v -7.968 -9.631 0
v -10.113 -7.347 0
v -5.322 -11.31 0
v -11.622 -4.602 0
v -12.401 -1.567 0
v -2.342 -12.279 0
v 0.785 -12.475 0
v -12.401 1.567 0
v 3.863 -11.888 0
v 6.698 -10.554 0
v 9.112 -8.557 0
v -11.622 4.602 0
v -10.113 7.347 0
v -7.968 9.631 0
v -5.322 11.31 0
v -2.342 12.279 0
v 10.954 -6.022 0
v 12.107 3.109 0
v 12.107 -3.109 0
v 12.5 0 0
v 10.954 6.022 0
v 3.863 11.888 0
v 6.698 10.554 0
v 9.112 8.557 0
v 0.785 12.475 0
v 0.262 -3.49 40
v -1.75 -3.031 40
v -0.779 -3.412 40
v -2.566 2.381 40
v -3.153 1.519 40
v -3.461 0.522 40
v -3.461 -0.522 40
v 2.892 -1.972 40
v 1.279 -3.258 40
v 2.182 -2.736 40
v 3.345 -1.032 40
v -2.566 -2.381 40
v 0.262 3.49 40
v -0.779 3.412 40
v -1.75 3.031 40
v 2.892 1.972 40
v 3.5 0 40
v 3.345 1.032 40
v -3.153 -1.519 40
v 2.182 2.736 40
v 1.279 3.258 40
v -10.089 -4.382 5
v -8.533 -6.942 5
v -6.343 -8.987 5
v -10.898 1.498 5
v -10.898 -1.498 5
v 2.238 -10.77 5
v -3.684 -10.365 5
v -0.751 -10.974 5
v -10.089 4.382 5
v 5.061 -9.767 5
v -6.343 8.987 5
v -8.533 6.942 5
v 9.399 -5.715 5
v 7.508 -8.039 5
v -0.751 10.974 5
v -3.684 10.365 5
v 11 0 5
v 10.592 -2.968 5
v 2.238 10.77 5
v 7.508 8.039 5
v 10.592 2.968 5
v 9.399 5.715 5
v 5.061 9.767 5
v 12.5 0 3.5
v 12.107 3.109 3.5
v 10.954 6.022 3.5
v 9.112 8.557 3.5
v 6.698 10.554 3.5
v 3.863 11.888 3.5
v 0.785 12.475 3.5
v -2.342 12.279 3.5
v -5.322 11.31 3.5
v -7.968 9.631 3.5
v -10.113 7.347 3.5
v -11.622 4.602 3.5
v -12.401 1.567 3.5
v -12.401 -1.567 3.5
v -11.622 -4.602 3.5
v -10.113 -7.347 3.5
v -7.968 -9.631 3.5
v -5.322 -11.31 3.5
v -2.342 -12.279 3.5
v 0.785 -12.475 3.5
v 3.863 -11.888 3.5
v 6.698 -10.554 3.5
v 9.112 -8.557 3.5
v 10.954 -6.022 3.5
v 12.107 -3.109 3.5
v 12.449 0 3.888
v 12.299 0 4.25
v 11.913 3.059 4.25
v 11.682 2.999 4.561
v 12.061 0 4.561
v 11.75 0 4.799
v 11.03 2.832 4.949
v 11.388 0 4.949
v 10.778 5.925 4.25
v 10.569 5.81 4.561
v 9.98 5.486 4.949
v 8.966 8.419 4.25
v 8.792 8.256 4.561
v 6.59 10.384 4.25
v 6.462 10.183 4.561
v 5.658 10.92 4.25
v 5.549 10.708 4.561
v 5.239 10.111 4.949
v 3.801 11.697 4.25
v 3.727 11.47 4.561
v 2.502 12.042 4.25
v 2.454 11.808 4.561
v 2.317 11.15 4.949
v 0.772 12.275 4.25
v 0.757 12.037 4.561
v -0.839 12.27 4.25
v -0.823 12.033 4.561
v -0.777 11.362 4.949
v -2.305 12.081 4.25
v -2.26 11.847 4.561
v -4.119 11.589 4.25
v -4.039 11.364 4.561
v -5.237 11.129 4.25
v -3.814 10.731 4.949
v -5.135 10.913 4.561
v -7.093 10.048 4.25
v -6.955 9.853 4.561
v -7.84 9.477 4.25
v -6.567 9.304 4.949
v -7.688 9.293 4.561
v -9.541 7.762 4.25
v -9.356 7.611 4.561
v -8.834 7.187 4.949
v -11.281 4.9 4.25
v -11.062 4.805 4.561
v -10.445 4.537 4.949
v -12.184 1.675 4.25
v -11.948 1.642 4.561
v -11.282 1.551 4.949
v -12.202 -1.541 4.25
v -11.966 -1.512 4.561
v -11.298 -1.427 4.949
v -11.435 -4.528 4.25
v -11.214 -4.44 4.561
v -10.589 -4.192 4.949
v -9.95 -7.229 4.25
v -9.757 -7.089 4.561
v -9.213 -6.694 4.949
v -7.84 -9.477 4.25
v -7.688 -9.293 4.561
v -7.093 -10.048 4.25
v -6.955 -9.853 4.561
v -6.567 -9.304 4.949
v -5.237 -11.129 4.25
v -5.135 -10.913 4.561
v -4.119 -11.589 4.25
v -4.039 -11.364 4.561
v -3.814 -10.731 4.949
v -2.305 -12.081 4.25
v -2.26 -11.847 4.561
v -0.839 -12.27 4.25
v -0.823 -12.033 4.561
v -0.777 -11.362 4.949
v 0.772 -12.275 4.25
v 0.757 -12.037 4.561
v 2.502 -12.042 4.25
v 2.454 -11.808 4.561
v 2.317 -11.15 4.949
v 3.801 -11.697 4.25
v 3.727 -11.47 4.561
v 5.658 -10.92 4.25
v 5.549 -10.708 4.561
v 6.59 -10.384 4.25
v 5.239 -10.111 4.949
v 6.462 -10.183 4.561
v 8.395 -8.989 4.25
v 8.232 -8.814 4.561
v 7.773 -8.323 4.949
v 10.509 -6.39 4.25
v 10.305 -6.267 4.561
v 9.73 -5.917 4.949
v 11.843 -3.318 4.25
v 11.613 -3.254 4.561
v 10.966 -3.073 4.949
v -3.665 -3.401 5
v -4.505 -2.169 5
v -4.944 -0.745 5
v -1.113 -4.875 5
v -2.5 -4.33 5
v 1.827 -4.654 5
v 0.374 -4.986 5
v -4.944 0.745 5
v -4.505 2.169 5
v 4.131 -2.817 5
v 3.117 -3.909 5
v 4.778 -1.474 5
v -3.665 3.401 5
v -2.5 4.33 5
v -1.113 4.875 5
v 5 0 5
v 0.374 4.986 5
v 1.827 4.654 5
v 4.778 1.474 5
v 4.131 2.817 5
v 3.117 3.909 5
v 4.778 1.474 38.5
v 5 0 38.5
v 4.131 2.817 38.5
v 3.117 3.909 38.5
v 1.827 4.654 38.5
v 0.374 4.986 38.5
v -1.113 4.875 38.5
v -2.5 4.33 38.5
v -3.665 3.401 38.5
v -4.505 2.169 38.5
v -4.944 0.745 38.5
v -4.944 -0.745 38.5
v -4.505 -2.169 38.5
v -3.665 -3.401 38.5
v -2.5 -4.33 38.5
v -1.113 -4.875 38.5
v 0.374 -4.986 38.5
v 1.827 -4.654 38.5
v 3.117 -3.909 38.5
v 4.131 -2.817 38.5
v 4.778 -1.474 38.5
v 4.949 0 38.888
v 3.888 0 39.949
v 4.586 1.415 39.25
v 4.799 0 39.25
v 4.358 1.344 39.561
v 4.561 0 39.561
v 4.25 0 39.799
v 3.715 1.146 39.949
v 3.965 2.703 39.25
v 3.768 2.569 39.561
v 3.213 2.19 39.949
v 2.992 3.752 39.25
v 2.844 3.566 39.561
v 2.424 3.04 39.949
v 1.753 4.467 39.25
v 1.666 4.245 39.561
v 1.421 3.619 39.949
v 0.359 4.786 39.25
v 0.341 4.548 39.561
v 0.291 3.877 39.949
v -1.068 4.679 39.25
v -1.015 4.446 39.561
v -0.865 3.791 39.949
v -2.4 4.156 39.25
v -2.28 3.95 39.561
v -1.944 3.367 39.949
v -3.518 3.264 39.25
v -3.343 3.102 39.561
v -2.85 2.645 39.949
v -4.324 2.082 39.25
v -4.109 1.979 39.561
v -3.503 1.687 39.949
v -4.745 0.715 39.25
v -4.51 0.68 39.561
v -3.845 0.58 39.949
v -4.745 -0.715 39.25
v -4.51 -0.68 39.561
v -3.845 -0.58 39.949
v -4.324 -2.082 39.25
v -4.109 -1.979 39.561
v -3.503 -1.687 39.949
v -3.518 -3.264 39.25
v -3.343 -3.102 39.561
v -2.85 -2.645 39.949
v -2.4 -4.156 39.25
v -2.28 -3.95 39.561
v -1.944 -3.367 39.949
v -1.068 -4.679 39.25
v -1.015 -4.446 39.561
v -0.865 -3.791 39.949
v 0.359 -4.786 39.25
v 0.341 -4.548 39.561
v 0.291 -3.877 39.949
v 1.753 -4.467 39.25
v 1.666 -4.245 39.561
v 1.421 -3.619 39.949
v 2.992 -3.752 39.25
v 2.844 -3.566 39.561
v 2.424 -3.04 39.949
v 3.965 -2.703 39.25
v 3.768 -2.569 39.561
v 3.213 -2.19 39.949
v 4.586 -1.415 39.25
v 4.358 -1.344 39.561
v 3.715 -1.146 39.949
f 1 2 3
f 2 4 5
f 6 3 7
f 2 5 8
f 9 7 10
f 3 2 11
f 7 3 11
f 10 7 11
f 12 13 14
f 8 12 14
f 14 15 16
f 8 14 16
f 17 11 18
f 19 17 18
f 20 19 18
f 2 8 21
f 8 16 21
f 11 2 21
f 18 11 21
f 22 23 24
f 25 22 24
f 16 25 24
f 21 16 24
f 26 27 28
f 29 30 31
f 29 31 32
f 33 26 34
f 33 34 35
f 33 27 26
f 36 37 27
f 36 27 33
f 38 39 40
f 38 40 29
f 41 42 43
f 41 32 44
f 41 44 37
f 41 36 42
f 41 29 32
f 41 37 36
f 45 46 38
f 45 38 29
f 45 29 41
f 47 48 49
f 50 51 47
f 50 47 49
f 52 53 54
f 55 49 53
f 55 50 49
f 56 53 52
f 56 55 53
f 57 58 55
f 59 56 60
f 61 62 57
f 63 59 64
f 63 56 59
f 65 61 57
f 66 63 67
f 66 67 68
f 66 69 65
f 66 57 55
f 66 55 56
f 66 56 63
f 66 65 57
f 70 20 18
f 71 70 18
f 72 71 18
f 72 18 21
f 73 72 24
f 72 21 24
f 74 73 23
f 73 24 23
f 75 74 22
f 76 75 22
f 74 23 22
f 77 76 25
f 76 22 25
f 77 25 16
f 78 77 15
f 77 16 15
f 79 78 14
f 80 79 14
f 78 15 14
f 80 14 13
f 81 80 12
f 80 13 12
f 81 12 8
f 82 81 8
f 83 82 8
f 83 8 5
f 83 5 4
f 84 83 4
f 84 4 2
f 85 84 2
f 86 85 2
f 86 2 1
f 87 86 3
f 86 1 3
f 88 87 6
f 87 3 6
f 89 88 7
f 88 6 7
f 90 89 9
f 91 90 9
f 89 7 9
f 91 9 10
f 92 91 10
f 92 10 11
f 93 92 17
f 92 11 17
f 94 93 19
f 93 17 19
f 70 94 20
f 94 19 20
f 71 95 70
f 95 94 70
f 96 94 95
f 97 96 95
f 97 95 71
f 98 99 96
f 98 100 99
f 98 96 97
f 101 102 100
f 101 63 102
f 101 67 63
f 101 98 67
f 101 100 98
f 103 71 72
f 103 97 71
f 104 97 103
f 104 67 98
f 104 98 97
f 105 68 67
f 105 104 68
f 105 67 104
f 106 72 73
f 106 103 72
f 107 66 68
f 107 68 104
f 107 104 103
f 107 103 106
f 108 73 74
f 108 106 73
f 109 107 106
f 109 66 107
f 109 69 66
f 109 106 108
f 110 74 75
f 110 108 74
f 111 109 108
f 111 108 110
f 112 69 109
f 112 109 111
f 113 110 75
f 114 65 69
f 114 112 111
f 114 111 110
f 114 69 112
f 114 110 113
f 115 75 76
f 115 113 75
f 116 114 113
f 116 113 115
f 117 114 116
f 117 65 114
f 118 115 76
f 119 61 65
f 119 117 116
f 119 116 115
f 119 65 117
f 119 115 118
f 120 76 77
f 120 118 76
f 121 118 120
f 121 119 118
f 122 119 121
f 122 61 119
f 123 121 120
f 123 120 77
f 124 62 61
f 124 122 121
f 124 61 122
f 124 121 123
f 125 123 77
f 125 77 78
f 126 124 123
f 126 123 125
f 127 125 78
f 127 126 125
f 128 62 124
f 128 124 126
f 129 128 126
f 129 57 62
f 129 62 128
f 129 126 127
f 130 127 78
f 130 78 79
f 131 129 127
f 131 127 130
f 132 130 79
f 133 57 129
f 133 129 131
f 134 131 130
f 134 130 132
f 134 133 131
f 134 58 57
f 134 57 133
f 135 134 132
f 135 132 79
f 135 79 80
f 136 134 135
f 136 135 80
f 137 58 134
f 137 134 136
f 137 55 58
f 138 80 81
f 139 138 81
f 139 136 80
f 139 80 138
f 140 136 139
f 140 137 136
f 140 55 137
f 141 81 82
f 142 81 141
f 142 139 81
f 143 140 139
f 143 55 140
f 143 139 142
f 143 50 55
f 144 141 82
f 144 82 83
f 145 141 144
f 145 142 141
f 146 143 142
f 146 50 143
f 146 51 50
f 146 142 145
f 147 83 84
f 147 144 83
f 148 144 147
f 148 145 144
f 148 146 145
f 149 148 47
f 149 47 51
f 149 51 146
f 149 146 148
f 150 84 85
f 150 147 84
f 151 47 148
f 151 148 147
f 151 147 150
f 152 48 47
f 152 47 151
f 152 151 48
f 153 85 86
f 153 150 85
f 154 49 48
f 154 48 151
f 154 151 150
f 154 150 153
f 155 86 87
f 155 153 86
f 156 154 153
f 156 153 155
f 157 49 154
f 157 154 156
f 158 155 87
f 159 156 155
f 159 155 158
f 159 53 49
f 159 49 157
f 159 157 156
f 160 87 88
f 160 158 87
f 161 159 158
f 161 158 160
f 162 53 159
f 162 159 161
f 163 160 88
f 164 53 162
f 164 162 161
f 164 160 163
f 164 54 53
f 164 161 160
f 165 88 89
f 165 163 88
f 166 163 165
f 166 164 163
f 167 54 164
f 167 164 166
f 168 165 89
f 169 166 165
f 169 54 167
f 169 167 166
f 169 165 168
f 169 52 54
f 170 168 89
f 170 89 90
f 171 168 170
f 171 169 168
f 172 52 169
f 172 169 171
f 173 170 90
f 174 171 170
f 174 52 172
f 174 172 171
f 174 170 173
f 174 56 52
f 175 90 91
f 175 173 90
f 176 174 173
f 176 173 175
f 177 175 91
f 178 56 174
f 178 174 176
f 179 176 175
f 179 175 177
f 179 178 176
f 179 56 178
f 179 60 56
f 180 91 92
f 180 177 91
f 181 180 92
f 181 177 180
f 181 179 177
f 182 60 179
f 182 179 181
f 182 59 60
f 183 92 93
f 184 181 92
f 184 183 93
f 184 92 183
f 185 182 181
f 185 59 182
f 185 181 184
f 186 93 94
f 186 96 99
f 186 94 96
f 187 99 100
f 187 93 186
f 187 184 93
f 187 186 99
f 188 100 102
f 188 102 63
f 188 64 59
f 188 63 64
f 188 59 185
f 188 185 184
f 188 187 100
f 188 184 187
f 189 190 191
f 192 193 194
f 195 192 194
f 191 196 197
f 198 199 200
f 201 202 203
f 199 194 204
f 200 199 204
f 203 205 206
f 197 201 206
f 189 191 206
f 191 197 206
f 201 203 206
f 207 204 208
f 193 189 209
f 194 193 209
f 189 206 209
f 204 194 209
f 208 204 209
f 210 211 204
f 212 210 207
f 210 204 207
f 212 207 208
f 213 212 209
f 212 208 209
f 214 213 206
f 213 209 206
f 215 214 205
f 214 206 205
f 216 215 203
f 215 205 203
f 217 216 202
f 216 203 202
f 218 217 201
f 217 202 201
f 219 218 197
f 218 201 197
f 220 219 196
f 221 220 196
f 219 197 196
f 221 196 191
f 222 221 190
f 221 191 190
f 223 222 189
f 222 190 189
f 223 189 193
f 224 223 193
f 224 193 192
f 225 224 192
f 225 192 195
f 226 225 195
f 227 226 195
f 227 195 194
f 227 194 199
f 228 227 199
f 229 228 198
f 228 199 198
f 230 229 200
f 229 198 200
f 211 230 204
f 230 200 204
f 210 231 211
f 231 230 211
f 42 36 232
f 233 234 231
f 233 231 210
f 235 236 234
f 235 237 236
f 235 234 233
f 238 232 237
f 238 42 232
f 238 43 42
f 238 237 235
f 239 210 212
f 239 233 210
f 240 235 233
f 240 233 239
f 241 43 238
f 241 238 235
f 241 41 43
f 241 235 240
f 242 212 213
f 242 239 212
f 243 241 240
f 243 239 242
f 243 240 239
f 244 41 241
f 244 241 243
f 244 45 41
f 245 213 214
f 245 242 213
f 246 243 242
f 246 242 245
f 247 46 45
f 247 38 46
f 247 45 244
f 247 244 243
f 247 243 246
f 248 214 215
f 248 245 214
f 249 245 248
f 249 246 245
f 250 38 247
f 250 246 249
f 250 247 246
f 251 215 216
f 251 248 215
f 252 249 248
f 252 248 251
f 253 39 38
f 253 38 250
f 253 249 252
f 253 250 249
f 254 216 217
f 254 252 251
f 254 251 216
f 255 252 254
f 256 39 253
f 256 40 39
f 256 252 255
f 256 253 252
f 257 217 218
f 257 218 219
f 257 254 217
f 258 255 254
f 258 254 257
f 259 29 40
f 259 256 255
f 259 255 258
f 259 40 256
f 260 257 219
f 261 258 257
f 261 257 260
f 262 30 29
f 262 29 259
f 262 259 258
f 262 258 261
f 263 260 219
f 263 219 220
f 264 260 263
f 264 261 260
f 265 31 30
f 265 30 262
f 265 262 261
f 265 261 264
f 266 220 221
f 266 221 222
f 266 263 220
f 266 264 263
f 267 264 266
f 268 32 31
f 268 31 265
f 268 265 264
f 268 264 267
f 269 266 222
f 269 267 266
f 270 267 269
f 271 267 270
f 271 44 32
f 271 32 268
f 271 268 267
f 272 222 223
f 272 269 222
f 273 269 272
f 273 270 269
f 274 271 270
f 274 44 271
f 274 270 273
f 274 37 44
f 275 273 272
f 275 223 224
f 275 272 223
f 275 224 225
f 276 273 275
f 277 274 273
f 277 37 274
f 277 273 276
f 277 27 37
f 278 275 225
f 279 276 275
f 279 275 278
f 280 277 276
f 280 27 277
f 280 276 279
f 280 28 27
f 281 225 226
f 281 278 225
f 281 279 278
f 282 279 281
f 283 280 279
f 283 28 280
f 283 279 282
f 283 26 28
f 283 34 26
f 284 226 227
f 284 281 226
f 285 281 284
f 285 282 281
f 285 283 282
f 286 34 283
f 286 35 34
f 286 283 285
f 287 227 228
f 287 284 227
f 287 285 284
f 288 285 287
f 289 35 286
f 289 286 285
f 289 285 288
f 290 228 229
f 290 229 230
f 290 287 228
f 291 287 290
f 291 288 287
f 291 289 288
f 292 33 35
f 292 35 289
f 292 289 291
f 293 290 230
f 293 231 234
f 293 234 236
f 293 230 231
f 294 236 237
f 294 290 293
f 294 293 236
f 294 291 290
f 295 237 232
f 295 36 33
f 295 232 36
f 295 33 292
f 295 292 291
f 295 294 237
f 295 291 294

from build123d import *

# Parameters (mm, degrees)
F0_R     = 12.5
F1_DEPTH = 5
F2_R     = 5
F3_DEPTH = 35
F4_R     = 1.5
F4_2_R   = 1.5


with BuildPart() as f1:
    # F0 (on Top) → F1 (new body)
    with BuildSketch(Plane.XY):
        Circle(F0_R)
    extrude(amount=F1_DEPTH)

    # F4#2
    f4_2_edges = [f1.edges().sort_by_distance(p)[0] for p in [
        (-12.5, 0, 5),
    ]]
    fillet(f4_2_edges, radius=F4_2_R)


with BuildPart() as f3:
    # F2 (on face) → F3 (new body)
    with BuildSketch(Plane.XY.offset(5)):
        Circle(F2_R)
    extrude(amount=F3_DEPTH)

    # F4
    f4_edges = [f3.edges().sort_by_distance(p)[0] for p in [
        (-5, 0, 40),
    ]]
    fillet(f4_edges, radius=F4_R)


solid = Compound([f1.part, f3.part])
